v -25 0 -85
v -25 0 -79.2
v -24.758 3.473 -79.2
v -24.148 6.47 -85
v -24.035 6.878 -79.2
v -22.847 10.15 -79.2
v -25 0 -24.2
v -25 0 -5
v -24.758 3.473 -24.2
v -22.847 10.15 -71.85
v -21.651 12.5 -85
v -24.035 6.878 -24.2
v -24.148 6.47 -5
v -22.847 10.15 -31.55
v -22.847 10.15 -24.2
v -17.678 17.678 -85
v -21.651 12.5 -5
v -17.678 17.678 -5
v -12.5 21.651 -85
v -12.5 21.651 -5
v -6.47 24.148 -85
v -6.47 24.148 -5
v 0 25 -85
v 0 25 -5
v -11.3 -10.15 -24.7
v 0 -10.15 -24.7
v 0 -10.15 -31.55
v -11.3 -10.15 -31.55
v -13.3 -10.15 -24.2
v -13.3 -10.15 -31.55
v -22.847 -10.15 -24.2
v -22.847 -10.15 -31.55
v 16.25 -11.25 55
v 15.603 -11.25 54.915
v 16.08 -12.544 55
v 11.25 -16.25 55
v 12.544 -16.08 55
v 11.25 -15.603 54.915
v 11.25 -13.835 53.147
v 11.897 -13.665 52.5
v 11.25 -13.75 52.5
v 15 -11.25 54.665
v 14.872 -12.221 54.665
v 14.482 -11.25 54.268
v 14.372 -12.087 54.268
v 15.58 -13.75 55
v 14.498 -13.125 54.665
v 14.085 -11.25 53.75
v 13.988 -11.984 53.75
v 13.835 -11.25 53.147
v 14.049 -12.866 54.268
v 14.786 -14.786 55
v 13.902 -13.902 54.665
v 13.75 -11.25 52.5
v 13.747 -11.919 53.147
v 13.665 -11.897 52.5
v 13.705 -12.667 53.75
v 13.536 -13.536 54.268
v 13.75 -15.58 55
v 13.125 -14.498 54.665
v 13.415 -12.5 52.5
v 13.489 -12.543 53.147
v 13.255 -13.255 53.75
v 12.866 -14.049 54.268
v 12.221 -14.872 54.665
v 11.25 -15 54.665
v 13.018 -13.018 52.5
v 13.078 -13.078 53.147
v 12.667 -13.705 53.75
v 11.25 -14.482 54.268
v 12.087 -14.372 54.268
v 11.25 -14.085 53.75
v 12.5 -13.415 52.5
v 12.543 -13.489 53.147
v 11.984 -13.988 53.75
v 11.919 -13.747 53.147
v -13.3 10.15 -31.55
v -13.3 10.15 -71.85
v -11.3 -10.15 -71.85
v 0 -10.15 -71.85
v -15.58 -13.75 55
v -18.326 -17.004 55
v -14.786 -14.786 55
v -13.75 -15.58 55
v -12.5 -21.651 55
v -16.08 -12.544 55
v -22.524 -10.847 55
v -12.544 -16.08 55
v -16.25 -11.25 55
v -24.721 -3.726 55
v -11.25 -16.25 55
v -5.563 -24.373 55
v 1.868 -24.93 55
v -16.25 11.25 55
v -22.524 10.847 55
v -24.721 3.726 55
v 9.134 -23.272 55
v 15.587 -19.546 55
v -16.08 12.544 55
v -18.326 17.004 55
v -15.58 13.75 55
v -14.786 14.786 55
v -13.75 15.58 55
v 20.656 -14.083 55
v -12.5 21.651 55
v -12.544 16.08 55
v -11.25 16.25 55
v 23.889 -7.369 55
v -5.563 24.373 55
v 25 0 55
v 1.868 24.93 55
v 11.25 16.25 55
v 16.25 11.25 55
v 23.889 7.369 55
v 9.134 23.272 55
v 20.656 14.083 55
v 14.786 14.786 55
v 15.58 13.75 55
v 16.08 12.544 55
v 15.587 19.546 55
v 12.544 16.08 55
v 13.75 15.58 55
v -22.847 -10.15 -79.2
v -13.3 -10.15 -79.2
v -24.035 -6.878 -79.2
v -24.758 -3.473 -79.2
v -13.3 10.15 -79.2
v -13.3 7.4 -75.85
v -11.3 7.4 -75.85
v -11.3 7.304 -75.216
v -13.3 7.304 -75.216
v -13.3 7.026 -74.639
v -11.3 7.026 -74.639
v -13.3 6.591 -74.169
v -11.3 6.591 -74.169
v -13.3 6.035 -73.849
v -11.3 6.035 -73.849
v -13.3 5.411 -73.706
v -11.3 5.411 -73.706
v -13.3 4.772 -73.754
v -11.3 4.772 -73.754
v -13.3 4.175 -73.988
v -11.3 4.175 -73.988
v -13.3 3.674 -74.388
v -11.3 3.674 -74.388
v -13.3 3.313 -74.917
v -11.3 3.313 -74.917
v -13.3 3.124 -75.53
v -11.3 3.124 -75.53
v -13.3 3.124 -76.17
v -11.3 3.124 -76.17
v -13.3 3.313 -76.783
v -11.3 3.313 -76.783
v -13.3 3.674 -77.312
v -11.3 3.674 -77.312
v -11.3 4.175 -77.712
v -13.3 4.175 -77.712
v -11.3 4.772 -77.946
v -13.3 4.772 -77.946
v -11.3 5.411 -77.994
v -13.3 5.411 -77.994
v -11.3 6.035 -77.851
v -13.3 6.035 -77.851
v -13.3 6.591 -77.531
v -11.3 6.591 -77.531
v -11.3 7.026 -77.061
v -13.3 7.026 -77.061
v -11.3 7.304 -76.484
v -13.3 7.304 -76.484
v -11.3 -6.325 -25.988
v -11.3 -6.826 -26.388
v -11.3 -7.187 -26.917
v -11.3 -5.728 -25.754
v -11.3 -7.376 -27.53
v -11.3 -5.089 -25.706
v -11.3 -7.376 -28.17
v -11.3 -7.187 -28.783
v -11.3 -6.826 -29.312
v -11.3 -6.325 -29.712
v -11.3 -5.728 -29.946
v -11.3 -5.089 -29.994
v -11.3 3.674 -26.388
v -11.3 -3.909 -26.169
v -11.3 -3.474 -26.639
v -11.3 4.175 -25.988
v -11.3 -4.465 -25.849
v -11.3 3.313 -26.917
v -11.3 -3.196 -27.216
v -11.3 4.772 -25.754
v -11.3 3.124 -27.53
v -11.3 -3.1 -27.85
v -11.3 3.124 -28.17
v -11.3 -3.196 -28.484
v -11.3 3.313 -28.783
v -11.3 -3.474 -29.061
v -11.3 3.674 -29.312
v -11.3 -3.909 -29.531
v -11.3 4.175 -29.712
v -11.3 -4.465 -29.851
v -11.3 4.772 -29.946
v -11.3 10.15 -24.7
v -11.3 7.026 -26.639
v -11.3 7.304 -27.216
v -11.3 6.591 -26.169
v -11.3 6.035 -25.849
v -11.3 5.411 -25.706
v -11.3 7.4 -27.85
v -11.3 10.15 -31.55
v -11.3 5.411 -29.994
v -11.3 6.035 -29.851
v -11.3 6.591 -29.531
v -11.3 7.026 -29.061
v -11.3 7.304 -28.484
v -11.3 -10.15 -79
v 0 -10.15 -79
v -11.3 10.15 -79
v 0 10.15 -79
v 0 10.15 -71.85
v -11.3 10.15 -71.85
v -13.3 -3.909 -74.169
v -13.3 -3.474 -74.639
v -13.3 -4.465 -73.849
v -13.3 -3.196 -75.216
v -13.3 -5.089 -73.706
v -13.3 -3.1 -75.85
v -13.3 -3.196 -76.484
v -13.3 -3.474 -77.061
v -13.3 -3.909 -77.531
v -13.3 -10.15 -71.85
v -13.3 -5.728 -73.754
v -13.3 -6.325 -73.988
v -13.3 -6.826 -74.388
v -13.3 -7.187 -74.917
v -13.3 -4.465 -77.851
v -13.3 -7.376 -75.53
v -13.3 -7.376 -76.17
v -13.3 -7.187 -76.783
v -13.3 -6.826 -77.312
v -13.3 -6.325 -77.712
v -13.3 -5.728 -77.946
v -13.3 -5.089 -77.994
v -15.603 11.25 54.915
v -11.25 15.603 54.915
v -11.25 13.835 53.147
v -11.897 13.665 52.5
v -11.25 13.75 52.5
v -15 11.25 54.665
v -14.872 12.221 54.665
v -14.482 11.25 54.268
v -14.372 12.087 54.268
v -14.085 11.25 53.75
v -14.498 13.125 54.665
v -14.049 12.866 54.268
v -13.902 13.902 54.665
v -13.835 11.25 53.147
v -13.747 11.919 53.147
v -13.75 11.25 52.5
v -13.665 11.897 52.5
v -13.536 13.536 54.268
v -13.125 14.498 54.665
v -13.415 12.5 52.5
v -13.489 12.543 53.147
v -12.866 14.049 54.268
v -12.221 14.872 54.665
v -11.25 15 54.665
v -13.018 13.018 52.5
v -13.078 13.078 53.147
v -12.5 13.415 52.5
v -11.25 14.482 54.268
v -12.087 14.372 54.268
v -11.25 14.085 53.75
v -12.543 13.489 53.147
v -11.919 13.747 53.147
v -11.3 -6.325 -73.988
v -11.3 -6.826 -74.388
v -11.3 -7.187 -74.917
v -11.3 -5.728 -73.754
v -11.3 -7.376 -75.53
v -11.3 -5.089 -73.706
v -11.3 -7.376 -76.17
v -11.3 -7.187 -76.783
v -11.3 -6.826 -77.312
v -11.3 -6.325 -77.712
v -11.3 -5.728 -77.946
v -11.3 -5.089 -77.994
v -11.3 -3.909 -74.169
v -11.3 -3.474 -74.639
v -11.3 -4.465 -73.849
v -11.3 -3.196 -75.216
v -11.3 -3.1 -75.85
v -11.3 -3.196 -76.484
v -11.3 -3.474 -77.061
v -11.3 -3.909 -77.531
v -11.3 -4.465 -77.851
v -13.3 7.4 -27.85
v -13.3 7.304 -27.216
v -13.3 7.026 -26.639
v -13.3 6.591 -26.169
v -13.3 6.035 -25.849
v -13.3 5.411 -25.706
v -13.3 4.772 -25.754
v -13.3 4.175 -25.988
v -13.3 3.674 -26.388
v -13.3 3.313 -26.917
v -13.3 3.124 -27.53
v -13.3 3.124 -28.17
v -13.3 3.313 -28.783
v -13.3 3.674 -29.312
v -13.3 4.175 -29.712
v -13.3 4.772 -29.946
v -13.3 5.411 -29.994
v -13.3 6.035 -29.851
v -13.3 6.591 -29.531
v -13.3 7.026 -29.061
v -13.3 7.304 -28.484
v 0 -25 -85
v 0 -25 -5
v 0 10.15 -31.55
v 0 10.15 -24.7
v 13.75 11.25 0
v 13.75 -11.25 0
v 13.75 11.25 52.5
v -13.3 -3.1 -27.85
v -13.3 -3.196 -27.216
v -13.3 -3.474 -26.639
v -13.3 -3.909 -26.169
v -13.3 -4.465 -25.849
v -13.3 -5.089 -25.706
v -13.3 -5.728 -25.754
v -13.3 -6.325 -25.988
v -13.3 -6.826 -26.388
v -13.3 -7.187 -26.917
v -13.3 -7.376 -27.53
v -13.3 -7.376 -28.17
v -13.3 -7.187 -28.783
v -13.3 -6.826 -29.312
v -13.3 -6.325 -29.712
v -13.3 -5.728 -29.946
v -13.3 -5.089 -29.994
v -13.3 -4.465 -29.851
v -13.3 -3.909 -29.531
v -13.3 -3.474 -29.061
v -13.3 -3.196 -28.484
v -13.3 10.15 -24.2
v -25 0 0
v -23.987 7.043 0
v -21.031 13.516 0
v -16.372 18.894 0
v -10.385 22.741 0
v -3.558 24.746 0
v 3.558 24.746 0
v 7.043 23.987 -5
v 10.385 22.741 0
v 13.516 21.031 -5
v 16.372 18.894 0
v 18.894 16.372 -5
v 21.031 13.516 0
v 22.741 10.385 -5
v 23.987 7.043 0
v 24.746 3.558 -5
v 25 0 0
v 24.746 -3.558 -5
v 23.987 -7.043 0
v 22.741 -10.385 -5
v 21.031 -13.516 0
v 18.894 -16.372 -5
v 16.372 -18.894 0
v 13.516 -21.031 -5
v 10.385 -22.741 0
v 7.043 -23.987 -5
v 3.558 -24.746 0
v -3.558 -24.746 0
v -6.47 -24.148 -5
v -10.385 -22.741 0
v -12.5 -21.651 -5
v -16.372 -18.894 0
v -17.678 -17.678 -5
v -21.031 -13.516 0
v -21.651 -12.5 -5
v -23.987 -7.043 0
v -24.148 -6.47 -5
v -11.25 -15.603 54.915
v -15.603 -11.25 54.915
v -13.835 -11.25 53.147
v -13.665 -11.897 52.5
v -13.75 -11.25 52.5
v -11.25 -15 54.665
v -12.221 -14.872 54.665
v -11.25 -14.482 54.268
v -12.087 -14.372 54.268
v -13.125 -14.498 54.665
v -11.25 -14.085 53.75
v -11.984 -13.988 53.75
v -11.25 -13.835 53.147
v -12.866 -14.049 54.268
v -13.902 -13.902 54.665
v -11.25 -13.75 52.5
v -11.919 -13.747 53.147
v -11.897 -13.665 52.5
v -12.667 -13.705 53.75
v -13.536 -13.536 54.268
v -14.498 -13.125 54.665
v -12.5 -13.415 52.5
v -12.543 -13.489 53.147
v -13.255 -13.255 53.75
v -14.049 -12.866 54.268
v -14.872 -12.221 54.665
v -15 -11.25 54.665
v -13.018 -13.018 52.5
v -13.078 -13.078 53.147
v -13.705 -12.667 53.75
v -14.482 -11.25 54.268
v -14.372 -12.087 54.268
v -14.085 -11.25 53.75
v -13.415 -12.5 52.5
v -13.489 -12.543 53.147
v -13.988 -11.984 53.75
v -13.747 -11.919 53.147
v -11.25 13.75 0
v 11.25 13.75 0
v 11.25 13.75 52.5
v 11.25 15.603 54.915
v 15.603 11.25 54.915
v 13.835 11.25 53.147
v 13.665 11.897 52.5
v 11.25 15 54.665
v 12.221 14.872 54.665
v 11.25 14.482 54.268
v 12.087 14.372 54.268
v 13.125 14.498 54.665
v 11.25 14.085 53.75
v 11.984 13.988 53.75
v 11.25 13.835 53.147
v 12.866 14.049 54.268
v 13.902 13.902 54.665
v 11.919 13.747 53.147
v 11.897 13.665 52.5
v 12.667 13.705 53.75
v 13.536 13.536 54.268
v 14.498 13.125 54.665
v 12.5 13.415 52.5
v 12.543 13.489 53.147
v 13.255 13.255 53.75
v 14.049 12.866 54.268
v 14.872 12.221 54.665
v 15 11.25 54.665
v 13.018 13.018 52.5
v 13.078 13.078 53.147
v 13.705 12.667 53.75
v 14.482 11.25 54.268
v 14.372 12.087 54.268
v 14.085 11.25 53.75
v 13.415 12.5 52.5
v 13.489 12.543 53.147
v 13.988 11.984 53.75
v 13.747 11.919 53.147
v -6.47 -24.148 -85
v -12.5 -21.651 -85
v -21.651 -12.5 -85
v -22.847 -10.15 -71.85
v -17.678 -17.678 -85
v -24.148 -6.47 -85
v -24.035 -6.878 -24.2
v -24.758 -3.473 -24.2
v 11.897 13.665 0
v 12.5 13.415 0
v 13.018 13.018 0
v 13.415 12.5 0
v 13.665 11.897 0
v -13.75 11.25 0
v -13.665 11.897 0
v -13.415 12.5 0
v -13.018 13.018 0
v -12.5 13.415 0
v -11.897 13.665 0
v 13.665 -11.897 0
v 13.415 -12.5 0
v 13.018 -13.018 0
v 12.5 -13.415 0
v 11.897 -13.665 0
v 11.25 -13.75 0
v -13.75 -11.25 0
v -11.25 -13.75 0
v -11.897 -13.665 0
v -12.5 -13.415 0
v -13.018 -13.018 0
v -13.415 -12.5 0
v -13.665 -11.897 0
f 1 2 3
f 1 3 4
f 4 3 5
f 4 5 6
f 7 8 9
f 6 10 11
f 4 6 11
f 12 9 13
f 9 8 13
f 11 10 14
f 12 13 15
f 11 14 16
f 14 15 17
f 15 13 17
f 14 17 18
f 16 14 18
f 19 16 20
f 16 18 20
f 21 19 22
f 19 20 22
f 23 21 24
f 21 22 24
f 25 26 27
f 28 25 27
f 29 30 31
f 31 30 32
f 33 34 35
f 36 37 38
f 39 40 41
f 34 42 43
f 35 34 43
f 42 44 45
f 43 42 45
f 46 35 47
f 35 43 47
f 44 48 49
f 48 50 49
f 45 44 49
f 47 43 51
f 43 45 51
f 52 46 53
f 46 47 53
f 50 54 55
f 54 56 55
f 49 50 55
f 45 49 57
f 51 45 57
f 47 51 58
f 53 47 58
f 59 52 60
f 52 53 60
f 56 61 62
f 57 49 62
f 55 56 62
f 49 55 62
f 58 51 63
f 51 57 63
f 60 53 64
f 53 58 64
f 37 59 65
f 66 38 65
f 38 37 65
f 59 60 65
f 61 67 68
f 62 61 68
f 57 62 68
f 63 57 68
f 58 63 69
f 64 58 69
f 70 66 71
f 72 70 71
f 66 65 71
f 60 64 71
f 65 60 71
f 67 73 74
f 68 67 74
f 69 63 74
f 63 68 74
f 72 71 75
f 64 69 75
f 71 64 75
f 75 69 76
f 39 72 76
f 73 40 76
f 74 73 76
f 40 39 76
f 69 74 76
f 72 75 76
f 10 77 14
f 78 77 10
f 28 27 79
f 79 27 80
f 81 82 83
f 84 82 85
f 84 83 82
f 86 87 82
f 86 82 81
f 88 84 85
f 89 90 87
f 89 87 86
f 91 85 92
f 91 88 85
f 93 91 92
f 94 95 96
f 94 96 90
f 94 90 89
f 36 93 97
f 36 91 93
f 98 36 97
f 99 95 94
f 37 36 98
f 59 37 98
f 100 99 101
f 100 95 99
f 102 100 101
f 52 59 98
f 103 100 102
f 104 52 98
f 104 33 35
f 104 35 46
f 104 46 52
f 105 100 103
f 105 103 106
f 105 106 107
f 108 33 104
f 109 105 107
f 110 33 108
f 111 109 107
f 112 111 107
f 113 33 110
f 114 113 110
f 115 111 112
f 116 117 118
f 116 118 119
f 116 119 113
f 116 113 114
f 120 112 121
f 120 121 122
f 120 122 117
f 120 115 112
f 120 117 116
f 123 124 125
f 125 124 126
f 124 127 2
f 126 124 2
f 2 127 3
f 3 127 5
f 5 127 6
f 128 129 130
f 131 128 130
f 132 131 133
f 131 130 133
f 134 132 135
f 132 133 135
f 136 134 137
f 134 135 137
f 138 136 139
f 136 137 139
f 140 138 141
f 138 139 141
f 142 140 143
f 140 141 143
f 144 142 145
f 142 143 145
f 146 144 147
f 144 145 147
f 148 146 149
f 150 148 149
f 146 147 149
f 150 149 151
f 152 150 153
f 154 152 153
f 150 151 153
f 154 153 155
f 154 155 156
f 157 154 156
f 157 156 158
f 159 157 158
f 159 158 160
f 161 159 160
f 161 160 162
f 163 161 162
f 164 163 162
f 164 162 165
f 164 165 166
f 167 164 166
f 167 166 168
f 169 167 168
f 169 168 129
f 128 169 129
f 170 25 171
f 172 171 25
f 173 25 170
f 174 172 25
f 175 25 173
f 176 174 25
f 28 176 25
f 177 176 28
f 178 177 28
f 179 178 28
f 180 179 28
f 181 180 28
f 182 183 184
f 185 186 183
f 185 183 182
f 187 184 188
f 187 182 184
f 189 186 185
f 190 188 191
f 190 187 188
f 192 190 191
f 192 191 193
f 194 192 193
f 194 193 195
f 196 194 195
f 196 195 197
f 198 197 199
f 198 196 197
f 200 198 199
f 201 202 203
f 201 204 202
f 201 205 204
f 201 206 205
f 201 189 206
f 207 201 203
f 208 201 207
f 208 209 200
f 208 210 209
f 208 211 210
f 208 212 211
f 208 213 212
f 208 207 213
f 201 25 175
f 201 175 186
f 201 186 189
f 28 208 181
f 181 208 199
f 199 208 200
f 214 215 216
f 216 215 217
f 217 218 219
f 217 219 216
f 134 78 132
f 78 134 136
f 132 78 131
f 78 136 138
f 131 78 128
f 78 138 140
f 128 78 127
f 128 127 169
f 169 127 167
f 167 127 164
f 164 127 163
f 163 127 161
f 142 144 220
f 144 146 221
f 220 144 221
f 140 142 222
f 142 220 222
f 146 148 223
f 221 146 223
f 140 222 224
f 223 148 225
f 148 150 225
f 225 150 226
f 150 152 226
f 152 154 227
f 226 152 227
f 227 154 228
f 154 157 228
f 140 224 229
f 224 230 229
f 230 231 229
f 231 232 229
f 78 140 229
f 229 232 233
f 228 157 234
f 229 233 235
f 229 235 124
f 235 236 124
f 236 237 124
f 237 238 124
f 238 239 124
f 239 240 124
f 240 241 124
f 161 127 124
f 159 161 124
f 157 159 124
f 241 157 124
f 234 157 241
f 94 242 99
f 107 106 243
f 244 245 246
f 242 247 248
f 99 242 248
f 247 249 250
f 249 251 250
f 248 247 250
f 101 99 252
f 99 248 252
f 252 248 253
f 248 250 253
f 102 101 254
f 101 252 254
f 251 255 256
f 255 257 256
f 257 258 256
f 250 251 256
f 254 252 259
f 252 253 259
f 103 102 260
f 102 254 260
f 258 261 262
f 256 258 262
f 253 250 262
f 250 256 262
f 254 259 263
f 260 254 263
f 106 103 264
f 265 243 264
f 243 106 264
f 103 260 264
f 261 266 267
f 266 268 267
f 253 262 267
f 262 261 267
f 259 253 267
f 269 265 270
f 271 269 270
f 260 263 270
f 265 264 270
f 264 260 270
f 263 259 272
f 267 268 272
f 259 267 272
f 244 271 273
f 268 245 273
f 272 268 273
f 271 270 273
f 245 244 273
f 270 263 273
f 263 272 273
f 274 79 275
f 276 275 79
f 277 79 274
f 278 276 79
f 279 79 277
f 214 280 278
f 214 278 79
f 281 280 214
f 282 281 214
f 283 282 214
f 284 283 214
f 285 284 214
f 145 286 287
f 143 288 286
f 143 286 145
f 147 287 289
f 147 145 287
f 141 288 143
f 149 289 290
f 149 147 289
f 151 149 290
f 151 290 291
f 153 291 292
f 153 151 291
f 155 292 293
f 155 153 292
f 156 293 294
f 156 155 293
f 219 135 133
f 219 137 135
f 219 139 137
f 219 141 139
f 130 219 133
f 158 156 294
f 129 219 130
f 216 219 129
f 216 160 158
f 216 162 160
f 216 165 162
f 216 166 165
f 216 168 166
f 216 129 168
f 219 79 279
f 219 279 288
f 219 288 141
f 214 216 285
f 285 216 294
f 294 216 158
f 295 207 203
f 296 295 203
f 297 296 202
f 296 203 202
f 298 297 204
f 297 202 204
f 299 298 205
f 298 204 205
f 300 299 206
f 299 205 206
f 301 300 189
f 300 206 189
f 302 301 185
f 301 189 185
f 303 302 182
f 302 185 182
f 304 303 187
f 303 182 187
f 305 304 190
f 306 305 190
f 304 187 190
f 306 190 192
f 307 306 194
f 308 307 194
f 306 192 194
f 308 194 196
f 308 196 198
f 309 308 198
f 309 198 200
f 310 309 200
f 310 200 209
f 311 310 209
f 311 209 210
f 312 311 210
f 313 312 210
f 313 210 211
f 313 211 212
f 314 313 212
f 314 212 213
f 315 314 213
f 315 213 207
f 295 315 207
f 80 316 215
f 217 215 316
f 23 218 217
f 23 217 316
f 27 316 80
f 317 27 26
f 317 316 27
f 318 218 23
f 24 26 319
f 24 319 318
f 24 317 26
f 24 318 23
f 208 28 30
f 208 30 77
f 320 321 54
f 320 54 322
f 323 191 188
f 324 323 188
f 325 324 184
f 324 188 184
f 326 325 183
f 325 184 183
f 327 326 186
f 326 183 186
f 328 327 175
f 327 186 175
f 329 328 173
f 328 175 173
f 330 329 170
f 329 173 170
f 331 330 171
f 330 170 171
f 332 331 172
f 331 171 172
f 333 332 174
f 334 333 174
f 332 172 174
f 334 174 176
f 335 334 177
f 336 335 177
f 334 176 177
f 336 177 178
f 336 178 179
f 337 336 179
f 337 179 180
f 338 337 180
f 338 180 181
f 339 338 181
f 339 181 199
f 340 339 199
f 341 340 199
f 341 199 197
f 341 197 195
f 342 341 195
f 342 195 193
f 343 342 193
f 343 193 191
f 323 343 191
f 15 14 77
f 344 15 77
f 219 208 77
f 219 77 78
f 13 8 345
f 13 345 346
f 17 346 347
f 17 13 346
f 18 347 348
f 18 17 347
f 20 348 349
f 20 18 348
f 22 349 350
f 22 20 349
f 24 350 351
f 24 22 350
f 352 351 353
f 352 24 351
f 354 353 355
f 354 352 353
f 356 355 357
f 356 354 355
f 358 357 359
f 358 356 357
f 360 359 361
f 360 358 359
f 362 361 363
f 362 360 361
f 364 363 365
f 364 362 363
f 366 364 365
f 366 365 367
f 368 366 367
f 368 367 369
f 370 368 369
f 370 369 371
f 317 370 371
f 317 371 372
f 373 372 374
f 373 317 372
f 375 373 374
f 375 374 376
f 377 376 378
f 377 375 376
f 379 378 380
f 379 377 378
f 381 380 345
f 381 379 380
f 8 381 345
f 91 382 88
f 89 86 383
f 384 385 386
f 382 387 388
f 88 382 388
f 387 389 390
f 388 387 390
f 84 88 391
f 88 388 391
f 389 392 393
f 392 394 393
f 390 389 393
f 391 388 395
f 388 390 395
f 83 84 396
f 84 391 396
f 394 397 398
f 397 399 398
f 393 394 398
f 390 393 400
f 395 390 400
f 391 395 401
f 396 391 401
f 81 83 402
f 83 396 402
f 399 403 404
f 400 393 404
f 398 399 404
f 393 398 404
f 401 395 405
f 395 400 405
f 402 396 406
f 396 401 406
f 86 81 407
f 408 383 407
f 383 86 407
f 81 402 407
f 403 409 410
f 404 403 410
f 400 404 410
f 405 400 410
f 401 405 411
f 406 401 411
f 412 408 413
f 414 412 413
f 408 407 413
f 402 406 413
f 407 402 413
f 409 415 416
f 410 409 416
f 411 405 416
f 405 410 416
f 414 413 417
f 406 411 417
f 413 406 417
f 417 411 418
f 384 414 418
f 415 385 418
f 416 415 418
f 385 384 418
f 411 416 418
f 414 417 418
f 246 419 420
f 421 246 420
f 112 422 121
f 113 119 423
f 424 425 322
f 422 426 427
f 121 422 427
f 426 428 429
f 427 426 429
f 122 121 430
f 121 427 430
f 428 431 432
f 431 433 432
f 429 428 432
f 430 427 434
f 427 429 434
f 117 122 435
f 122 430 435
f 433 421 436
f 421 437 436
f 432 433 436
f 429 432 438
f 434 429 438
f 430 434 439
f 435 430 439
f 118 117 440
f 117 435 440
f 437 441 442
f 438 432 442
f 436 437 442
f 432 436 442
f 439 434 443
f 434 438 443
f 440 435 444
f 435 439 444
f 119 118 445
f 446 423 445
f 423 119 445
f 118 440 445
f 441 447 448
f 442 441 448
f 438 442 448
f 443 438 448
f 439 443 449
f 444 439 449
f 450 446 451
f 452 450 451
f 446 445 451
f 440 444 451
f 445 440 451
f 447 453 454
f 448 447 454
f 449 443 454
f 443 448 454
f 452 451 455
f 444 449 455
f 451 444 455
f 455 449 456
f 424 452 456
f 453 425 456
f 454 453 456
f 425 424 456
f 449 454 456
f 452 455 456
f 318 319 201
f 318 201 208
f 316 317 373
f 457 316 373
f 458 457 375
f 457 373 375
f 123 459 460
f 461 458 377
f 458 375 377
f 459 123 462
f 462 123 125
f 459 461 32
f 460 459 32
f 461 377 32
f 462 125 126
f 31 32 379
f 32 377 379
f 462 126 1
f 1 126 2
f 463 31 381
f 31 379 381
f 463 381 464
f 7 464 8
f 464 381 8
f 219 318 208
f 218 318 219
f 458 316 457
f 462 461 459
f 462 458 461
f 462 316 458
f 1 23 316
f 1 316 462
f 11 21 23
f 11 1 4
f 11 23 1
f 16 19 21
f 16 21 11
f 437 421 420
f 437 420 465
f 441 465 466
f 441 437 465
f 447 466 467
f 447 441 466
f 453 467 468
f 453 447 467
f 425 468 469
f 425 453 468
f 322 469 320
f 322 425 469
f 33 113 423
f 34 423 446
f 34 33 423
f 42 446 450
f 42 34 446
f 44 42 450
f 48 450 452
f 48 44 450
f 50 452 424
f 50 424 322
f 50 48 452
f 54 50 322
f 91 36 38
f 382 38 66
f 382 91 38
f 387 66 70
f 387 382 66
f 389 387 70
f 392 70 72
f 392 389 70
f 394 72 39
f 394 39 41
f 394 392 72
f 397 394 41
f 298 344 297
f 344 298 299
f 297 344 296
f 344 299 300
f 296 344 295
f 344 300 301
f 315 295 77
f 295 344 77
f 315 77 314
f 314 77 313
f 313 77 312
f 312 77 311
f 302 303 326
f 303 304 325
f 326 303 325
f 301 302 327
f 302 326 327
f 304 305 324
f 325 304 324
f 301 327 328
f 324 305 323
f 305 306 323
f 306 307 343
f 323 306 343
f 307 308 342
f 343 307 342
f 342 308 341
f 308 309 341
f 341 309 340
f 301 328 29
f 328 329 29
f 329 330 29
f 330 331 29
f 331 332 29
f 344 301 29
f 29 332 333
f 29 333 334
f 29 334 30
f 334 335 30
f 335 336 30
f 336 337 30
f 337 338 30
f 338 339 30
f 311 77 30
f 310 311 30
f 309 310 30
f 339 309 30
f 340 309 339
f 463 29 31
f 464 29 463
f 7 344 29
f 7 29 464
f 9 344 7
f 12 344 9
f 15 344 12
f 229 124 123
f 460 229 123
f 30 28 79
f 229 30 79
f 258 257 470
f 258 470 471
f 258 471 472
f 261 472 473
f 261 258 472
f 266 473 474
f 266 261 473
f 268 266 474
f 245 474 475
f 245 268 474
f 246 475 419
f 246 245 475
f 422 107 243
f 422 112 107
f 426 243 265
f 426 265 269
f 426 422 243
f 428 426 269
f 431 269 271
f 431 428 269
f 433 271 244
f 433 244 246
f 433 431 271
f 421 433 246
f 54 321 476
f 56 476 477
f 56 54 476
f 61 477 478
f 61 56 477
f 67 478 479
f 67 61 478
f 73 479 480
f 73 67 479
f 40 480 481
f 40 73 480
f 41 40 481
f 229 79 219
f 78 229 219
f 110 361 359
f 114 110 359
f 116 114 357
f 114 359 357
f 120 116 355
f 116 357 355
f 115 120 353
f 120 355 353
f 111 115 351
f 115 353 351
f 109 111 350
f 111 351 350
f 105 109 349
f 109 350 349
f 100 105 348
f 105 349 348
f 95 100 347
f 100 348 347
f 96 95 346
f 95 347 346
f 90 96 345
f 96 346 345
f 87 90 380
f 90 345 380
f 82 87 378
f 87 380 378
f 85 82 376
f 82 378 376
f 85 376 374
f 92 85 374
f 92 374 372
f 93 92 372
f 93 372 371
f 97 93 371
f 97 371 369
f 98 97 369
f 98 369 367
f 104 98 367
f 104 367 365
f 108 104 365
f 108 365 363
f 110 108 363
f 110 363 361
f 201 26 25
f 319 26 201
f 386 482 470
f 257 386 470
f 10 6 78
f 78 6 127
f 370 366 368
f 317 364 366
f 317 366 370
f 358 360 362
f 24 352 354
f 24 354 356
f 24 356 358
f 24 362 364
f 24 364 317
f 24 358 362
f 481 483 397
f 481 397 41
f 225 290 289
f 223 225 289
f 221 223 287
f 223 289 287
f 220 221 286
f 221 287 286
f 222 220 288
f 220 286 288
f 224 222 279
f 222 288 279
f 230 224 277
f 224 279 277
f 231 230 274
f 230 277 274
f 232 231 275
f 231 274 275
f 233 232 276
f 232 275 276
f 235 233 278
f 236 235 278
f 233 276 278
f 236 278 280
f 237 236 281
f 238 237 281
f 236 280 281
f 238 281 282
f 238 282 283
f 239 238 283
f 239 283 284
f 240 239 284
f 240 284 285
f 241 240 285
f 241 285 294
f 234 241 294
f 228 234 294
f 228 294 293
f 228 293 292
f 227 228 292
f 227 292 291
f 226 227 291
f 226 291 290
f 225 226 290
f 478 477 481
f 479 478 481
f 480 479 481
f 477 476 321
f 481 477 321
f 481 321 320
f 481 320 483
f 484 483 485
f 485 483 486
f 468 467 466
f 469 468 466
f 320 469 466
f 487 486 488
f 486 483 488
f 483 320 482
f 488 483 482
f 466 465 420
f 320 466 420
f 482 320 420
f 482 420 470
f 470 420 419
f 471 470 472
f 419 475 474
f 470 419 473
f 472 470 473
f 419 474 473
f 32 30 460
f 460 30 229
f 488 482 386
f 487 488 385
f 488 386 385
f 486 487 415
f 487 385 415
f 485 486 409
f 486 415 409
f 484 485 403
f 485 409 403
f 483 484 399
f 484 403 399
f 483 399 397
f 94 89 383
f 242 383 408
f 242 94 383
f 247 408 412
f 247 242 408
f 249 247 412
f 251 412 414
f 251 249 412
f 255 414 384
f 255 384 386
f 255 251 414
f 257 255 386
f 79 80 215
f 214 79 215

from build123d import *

# Parameters (mm, degrees)
SKETCH1_R           = 25
SKETCH1_W           = 27.5
SKETCH1_H           = 27.5
BOSS_EXTRUDE1_DEPTH = 55
BOSS_EXTRUDE2_START = 5
SKETCH2_R           = 25
BOSS_EXTRUDE2_DEPTH = 5
SKETCH3_W           = 25
SKETCH3_H           = 50
BOSS_EXTRUDE3_DEPTH = 80
FILLET1_R           = 2.5
FILLET2_R           = 2.5
SKETCH21_W          = 54.3
SKETCH21_H          = 20.3
CUT_EXTRUDE1_DEPTH  = 11.3
SKETCH22_W          = 40.3
SKETCH22_H          = 20.3
CUT_EXTRUDE2_DEPTH  = 93.059763198
CUT_EXTRUDE3_DEPTH  = 88.464278423
SKETCH23_R          = 2.15
CUT_EXTRUDE4_DEPTH  = 93.059763198
CUT_EXTRUDE7_DEPTH  = 27.5


with BuildPart() as part:
    # Sketch1 → Boss-Extrude1 (new body)
    with BuildSketch(Plane.XY):
        Circle(SKETCH1_R)
        Rectangle(SKETCH1_W, SKETCH1_H, mode=Mode.SUBTRACT)
    extrude(amount=BOSS_EXTRUDE1_DEPTH)

    # Sketch2 → Boss-Extrude2 (add)
    with BuildSketch(Plane(origin=(0, 0, 0), x_dir=(-1, 0, 0), z_dir=(0, 0, -1)).offset(BOSS_EXTRUDE2_START)):
        Circle(SKETCH2_R)
    extrude(amount=-BOSS_EXTRUDE2_DEPTH)

    # Sketch3 → Boss-Extrude3 (add)
    with BuildSketch(Plane(origin=(0, 0, -5), x_dir=(-1, 0, 0), z_dir=(0, 0, -1))):
        with Locations((12.5, 0)):
            Rectangle(SKETCH3_W, SKETCH3_H)
    extrude(amount=BOSS_EXTRUDE3_DEPTH)

    # Fillet1
    fillet1_edges = [part.edges().sort_by_distance(p)[0] for p in [
        (-13.75, 13.75, 27.5),
        (13.75, 13.75, 27.5),
        (-13.75, -13.75, 27.5),
        (13.75, -13.75, 27.5),
    ]]
    fillet(fillet1_edges, radius=FILLET1_R)

    # Fillet2
    fillet2_edges = [part.edges().sort_by_distance(p)[0] for p in [
        (13.75, 0, 55),
    ]]
    fillet(fillet2_edges, radius=FILLET2_R)

    # Sketch21 → Cut-Extrude1 (cut)
    with BuildSketch(Plane(origin=(0, 0, 0), x_dir=(0, 0, -1), z_dir=(1, 0, 0))):
        with Locations((51.85, 0)):
            Rectangle(SKETCH21_W, SKETCH21_H)
    extrude(amount=-CUT_EXTRUDE1_DEPTH, mode=Mode.SUBTRACT)

    # Sketch22 → Cut-Extrude2 (cut, through all)
    with BuildSketch(Plane(origin=(0, 0, 0), x_dir=(0, 0, -1), z_dir=(1, 0, 0))):
        with Locations((51.7, 0)):
            Rectangle(SKETCH22_W, SKETCH22_H)
    extrude(amount=-CUT_EXTRUDE2_DEPTH, mode=Mode.SUBTRACT)

    # Sketch18 → Cut-Extrude3 (cut, through all)
    with BuildSketch(Plane.XY.offset(-5)):
        with BuildLine():
            Line((-25, -25), (0, -25))
            ThreePointArc((0, -25), (-17.67766953, -17.67766953), (-25, 0))
            Line((-25, 0), (-25, -25))
        make_face()
        with BuildLine():
            Line((-25, 25), (-25, 0))
            ThreePointArc((-25, 0), (-17.67766953, 17.67766953), (0, 25))
            Line((0, 25), (-25, 25))
        make_face()
    extrude(amount=-CUT_EXTRUDE3_DEPTH, mode=Mode.SUBTRACT)

    # Sketch23 → Cut-Extrude4 (cut, through all)
    with BuildSketch(Plane(origin=(0, 0, 0), x_dir=(0, 0, -1), z_dir=(1, 0, 0))):
        with Locations((75.85, 5.25)):
            Circle(SKETCH23_R)
        with Locations((75.85, -5.25)):
            Circle(SKETCH23_R)
        with Locations((27.85, 5.25)):
            Circle(SKETCH23_R)
        with Locations((27.85, -5.25)):
            Circle(SKETCH23_R)
    extrude(amount=-CUT_EXTRUDE4_DEPTH, mode=Mode.SUBTRACT)

    # Sketch24 → Cut-Extrude7 (cut, symmetric)
    with BuildSketch(Plane(origin=(0, 0, -51.7), x_dir=(-1, 0, 0), z_dir=(0, 0, -1))):
        with BuildLine():
            Line((13.3, 10.15), (13.3, -10.15))
            Line((13.3, -10.15), (22.846826913, -10.15))
            ThreePointArc((22.846826913, -10.15), (25, 0), (22.846826913, 10.15))
            Line((22.846826913, 10.15), (13.3, 10.15))
        make_face()
    extrude(amount=CUT_EXTRUDE7_DEPTH, both=True, mode=Mode.SUBTRACT)


solid = part.part
